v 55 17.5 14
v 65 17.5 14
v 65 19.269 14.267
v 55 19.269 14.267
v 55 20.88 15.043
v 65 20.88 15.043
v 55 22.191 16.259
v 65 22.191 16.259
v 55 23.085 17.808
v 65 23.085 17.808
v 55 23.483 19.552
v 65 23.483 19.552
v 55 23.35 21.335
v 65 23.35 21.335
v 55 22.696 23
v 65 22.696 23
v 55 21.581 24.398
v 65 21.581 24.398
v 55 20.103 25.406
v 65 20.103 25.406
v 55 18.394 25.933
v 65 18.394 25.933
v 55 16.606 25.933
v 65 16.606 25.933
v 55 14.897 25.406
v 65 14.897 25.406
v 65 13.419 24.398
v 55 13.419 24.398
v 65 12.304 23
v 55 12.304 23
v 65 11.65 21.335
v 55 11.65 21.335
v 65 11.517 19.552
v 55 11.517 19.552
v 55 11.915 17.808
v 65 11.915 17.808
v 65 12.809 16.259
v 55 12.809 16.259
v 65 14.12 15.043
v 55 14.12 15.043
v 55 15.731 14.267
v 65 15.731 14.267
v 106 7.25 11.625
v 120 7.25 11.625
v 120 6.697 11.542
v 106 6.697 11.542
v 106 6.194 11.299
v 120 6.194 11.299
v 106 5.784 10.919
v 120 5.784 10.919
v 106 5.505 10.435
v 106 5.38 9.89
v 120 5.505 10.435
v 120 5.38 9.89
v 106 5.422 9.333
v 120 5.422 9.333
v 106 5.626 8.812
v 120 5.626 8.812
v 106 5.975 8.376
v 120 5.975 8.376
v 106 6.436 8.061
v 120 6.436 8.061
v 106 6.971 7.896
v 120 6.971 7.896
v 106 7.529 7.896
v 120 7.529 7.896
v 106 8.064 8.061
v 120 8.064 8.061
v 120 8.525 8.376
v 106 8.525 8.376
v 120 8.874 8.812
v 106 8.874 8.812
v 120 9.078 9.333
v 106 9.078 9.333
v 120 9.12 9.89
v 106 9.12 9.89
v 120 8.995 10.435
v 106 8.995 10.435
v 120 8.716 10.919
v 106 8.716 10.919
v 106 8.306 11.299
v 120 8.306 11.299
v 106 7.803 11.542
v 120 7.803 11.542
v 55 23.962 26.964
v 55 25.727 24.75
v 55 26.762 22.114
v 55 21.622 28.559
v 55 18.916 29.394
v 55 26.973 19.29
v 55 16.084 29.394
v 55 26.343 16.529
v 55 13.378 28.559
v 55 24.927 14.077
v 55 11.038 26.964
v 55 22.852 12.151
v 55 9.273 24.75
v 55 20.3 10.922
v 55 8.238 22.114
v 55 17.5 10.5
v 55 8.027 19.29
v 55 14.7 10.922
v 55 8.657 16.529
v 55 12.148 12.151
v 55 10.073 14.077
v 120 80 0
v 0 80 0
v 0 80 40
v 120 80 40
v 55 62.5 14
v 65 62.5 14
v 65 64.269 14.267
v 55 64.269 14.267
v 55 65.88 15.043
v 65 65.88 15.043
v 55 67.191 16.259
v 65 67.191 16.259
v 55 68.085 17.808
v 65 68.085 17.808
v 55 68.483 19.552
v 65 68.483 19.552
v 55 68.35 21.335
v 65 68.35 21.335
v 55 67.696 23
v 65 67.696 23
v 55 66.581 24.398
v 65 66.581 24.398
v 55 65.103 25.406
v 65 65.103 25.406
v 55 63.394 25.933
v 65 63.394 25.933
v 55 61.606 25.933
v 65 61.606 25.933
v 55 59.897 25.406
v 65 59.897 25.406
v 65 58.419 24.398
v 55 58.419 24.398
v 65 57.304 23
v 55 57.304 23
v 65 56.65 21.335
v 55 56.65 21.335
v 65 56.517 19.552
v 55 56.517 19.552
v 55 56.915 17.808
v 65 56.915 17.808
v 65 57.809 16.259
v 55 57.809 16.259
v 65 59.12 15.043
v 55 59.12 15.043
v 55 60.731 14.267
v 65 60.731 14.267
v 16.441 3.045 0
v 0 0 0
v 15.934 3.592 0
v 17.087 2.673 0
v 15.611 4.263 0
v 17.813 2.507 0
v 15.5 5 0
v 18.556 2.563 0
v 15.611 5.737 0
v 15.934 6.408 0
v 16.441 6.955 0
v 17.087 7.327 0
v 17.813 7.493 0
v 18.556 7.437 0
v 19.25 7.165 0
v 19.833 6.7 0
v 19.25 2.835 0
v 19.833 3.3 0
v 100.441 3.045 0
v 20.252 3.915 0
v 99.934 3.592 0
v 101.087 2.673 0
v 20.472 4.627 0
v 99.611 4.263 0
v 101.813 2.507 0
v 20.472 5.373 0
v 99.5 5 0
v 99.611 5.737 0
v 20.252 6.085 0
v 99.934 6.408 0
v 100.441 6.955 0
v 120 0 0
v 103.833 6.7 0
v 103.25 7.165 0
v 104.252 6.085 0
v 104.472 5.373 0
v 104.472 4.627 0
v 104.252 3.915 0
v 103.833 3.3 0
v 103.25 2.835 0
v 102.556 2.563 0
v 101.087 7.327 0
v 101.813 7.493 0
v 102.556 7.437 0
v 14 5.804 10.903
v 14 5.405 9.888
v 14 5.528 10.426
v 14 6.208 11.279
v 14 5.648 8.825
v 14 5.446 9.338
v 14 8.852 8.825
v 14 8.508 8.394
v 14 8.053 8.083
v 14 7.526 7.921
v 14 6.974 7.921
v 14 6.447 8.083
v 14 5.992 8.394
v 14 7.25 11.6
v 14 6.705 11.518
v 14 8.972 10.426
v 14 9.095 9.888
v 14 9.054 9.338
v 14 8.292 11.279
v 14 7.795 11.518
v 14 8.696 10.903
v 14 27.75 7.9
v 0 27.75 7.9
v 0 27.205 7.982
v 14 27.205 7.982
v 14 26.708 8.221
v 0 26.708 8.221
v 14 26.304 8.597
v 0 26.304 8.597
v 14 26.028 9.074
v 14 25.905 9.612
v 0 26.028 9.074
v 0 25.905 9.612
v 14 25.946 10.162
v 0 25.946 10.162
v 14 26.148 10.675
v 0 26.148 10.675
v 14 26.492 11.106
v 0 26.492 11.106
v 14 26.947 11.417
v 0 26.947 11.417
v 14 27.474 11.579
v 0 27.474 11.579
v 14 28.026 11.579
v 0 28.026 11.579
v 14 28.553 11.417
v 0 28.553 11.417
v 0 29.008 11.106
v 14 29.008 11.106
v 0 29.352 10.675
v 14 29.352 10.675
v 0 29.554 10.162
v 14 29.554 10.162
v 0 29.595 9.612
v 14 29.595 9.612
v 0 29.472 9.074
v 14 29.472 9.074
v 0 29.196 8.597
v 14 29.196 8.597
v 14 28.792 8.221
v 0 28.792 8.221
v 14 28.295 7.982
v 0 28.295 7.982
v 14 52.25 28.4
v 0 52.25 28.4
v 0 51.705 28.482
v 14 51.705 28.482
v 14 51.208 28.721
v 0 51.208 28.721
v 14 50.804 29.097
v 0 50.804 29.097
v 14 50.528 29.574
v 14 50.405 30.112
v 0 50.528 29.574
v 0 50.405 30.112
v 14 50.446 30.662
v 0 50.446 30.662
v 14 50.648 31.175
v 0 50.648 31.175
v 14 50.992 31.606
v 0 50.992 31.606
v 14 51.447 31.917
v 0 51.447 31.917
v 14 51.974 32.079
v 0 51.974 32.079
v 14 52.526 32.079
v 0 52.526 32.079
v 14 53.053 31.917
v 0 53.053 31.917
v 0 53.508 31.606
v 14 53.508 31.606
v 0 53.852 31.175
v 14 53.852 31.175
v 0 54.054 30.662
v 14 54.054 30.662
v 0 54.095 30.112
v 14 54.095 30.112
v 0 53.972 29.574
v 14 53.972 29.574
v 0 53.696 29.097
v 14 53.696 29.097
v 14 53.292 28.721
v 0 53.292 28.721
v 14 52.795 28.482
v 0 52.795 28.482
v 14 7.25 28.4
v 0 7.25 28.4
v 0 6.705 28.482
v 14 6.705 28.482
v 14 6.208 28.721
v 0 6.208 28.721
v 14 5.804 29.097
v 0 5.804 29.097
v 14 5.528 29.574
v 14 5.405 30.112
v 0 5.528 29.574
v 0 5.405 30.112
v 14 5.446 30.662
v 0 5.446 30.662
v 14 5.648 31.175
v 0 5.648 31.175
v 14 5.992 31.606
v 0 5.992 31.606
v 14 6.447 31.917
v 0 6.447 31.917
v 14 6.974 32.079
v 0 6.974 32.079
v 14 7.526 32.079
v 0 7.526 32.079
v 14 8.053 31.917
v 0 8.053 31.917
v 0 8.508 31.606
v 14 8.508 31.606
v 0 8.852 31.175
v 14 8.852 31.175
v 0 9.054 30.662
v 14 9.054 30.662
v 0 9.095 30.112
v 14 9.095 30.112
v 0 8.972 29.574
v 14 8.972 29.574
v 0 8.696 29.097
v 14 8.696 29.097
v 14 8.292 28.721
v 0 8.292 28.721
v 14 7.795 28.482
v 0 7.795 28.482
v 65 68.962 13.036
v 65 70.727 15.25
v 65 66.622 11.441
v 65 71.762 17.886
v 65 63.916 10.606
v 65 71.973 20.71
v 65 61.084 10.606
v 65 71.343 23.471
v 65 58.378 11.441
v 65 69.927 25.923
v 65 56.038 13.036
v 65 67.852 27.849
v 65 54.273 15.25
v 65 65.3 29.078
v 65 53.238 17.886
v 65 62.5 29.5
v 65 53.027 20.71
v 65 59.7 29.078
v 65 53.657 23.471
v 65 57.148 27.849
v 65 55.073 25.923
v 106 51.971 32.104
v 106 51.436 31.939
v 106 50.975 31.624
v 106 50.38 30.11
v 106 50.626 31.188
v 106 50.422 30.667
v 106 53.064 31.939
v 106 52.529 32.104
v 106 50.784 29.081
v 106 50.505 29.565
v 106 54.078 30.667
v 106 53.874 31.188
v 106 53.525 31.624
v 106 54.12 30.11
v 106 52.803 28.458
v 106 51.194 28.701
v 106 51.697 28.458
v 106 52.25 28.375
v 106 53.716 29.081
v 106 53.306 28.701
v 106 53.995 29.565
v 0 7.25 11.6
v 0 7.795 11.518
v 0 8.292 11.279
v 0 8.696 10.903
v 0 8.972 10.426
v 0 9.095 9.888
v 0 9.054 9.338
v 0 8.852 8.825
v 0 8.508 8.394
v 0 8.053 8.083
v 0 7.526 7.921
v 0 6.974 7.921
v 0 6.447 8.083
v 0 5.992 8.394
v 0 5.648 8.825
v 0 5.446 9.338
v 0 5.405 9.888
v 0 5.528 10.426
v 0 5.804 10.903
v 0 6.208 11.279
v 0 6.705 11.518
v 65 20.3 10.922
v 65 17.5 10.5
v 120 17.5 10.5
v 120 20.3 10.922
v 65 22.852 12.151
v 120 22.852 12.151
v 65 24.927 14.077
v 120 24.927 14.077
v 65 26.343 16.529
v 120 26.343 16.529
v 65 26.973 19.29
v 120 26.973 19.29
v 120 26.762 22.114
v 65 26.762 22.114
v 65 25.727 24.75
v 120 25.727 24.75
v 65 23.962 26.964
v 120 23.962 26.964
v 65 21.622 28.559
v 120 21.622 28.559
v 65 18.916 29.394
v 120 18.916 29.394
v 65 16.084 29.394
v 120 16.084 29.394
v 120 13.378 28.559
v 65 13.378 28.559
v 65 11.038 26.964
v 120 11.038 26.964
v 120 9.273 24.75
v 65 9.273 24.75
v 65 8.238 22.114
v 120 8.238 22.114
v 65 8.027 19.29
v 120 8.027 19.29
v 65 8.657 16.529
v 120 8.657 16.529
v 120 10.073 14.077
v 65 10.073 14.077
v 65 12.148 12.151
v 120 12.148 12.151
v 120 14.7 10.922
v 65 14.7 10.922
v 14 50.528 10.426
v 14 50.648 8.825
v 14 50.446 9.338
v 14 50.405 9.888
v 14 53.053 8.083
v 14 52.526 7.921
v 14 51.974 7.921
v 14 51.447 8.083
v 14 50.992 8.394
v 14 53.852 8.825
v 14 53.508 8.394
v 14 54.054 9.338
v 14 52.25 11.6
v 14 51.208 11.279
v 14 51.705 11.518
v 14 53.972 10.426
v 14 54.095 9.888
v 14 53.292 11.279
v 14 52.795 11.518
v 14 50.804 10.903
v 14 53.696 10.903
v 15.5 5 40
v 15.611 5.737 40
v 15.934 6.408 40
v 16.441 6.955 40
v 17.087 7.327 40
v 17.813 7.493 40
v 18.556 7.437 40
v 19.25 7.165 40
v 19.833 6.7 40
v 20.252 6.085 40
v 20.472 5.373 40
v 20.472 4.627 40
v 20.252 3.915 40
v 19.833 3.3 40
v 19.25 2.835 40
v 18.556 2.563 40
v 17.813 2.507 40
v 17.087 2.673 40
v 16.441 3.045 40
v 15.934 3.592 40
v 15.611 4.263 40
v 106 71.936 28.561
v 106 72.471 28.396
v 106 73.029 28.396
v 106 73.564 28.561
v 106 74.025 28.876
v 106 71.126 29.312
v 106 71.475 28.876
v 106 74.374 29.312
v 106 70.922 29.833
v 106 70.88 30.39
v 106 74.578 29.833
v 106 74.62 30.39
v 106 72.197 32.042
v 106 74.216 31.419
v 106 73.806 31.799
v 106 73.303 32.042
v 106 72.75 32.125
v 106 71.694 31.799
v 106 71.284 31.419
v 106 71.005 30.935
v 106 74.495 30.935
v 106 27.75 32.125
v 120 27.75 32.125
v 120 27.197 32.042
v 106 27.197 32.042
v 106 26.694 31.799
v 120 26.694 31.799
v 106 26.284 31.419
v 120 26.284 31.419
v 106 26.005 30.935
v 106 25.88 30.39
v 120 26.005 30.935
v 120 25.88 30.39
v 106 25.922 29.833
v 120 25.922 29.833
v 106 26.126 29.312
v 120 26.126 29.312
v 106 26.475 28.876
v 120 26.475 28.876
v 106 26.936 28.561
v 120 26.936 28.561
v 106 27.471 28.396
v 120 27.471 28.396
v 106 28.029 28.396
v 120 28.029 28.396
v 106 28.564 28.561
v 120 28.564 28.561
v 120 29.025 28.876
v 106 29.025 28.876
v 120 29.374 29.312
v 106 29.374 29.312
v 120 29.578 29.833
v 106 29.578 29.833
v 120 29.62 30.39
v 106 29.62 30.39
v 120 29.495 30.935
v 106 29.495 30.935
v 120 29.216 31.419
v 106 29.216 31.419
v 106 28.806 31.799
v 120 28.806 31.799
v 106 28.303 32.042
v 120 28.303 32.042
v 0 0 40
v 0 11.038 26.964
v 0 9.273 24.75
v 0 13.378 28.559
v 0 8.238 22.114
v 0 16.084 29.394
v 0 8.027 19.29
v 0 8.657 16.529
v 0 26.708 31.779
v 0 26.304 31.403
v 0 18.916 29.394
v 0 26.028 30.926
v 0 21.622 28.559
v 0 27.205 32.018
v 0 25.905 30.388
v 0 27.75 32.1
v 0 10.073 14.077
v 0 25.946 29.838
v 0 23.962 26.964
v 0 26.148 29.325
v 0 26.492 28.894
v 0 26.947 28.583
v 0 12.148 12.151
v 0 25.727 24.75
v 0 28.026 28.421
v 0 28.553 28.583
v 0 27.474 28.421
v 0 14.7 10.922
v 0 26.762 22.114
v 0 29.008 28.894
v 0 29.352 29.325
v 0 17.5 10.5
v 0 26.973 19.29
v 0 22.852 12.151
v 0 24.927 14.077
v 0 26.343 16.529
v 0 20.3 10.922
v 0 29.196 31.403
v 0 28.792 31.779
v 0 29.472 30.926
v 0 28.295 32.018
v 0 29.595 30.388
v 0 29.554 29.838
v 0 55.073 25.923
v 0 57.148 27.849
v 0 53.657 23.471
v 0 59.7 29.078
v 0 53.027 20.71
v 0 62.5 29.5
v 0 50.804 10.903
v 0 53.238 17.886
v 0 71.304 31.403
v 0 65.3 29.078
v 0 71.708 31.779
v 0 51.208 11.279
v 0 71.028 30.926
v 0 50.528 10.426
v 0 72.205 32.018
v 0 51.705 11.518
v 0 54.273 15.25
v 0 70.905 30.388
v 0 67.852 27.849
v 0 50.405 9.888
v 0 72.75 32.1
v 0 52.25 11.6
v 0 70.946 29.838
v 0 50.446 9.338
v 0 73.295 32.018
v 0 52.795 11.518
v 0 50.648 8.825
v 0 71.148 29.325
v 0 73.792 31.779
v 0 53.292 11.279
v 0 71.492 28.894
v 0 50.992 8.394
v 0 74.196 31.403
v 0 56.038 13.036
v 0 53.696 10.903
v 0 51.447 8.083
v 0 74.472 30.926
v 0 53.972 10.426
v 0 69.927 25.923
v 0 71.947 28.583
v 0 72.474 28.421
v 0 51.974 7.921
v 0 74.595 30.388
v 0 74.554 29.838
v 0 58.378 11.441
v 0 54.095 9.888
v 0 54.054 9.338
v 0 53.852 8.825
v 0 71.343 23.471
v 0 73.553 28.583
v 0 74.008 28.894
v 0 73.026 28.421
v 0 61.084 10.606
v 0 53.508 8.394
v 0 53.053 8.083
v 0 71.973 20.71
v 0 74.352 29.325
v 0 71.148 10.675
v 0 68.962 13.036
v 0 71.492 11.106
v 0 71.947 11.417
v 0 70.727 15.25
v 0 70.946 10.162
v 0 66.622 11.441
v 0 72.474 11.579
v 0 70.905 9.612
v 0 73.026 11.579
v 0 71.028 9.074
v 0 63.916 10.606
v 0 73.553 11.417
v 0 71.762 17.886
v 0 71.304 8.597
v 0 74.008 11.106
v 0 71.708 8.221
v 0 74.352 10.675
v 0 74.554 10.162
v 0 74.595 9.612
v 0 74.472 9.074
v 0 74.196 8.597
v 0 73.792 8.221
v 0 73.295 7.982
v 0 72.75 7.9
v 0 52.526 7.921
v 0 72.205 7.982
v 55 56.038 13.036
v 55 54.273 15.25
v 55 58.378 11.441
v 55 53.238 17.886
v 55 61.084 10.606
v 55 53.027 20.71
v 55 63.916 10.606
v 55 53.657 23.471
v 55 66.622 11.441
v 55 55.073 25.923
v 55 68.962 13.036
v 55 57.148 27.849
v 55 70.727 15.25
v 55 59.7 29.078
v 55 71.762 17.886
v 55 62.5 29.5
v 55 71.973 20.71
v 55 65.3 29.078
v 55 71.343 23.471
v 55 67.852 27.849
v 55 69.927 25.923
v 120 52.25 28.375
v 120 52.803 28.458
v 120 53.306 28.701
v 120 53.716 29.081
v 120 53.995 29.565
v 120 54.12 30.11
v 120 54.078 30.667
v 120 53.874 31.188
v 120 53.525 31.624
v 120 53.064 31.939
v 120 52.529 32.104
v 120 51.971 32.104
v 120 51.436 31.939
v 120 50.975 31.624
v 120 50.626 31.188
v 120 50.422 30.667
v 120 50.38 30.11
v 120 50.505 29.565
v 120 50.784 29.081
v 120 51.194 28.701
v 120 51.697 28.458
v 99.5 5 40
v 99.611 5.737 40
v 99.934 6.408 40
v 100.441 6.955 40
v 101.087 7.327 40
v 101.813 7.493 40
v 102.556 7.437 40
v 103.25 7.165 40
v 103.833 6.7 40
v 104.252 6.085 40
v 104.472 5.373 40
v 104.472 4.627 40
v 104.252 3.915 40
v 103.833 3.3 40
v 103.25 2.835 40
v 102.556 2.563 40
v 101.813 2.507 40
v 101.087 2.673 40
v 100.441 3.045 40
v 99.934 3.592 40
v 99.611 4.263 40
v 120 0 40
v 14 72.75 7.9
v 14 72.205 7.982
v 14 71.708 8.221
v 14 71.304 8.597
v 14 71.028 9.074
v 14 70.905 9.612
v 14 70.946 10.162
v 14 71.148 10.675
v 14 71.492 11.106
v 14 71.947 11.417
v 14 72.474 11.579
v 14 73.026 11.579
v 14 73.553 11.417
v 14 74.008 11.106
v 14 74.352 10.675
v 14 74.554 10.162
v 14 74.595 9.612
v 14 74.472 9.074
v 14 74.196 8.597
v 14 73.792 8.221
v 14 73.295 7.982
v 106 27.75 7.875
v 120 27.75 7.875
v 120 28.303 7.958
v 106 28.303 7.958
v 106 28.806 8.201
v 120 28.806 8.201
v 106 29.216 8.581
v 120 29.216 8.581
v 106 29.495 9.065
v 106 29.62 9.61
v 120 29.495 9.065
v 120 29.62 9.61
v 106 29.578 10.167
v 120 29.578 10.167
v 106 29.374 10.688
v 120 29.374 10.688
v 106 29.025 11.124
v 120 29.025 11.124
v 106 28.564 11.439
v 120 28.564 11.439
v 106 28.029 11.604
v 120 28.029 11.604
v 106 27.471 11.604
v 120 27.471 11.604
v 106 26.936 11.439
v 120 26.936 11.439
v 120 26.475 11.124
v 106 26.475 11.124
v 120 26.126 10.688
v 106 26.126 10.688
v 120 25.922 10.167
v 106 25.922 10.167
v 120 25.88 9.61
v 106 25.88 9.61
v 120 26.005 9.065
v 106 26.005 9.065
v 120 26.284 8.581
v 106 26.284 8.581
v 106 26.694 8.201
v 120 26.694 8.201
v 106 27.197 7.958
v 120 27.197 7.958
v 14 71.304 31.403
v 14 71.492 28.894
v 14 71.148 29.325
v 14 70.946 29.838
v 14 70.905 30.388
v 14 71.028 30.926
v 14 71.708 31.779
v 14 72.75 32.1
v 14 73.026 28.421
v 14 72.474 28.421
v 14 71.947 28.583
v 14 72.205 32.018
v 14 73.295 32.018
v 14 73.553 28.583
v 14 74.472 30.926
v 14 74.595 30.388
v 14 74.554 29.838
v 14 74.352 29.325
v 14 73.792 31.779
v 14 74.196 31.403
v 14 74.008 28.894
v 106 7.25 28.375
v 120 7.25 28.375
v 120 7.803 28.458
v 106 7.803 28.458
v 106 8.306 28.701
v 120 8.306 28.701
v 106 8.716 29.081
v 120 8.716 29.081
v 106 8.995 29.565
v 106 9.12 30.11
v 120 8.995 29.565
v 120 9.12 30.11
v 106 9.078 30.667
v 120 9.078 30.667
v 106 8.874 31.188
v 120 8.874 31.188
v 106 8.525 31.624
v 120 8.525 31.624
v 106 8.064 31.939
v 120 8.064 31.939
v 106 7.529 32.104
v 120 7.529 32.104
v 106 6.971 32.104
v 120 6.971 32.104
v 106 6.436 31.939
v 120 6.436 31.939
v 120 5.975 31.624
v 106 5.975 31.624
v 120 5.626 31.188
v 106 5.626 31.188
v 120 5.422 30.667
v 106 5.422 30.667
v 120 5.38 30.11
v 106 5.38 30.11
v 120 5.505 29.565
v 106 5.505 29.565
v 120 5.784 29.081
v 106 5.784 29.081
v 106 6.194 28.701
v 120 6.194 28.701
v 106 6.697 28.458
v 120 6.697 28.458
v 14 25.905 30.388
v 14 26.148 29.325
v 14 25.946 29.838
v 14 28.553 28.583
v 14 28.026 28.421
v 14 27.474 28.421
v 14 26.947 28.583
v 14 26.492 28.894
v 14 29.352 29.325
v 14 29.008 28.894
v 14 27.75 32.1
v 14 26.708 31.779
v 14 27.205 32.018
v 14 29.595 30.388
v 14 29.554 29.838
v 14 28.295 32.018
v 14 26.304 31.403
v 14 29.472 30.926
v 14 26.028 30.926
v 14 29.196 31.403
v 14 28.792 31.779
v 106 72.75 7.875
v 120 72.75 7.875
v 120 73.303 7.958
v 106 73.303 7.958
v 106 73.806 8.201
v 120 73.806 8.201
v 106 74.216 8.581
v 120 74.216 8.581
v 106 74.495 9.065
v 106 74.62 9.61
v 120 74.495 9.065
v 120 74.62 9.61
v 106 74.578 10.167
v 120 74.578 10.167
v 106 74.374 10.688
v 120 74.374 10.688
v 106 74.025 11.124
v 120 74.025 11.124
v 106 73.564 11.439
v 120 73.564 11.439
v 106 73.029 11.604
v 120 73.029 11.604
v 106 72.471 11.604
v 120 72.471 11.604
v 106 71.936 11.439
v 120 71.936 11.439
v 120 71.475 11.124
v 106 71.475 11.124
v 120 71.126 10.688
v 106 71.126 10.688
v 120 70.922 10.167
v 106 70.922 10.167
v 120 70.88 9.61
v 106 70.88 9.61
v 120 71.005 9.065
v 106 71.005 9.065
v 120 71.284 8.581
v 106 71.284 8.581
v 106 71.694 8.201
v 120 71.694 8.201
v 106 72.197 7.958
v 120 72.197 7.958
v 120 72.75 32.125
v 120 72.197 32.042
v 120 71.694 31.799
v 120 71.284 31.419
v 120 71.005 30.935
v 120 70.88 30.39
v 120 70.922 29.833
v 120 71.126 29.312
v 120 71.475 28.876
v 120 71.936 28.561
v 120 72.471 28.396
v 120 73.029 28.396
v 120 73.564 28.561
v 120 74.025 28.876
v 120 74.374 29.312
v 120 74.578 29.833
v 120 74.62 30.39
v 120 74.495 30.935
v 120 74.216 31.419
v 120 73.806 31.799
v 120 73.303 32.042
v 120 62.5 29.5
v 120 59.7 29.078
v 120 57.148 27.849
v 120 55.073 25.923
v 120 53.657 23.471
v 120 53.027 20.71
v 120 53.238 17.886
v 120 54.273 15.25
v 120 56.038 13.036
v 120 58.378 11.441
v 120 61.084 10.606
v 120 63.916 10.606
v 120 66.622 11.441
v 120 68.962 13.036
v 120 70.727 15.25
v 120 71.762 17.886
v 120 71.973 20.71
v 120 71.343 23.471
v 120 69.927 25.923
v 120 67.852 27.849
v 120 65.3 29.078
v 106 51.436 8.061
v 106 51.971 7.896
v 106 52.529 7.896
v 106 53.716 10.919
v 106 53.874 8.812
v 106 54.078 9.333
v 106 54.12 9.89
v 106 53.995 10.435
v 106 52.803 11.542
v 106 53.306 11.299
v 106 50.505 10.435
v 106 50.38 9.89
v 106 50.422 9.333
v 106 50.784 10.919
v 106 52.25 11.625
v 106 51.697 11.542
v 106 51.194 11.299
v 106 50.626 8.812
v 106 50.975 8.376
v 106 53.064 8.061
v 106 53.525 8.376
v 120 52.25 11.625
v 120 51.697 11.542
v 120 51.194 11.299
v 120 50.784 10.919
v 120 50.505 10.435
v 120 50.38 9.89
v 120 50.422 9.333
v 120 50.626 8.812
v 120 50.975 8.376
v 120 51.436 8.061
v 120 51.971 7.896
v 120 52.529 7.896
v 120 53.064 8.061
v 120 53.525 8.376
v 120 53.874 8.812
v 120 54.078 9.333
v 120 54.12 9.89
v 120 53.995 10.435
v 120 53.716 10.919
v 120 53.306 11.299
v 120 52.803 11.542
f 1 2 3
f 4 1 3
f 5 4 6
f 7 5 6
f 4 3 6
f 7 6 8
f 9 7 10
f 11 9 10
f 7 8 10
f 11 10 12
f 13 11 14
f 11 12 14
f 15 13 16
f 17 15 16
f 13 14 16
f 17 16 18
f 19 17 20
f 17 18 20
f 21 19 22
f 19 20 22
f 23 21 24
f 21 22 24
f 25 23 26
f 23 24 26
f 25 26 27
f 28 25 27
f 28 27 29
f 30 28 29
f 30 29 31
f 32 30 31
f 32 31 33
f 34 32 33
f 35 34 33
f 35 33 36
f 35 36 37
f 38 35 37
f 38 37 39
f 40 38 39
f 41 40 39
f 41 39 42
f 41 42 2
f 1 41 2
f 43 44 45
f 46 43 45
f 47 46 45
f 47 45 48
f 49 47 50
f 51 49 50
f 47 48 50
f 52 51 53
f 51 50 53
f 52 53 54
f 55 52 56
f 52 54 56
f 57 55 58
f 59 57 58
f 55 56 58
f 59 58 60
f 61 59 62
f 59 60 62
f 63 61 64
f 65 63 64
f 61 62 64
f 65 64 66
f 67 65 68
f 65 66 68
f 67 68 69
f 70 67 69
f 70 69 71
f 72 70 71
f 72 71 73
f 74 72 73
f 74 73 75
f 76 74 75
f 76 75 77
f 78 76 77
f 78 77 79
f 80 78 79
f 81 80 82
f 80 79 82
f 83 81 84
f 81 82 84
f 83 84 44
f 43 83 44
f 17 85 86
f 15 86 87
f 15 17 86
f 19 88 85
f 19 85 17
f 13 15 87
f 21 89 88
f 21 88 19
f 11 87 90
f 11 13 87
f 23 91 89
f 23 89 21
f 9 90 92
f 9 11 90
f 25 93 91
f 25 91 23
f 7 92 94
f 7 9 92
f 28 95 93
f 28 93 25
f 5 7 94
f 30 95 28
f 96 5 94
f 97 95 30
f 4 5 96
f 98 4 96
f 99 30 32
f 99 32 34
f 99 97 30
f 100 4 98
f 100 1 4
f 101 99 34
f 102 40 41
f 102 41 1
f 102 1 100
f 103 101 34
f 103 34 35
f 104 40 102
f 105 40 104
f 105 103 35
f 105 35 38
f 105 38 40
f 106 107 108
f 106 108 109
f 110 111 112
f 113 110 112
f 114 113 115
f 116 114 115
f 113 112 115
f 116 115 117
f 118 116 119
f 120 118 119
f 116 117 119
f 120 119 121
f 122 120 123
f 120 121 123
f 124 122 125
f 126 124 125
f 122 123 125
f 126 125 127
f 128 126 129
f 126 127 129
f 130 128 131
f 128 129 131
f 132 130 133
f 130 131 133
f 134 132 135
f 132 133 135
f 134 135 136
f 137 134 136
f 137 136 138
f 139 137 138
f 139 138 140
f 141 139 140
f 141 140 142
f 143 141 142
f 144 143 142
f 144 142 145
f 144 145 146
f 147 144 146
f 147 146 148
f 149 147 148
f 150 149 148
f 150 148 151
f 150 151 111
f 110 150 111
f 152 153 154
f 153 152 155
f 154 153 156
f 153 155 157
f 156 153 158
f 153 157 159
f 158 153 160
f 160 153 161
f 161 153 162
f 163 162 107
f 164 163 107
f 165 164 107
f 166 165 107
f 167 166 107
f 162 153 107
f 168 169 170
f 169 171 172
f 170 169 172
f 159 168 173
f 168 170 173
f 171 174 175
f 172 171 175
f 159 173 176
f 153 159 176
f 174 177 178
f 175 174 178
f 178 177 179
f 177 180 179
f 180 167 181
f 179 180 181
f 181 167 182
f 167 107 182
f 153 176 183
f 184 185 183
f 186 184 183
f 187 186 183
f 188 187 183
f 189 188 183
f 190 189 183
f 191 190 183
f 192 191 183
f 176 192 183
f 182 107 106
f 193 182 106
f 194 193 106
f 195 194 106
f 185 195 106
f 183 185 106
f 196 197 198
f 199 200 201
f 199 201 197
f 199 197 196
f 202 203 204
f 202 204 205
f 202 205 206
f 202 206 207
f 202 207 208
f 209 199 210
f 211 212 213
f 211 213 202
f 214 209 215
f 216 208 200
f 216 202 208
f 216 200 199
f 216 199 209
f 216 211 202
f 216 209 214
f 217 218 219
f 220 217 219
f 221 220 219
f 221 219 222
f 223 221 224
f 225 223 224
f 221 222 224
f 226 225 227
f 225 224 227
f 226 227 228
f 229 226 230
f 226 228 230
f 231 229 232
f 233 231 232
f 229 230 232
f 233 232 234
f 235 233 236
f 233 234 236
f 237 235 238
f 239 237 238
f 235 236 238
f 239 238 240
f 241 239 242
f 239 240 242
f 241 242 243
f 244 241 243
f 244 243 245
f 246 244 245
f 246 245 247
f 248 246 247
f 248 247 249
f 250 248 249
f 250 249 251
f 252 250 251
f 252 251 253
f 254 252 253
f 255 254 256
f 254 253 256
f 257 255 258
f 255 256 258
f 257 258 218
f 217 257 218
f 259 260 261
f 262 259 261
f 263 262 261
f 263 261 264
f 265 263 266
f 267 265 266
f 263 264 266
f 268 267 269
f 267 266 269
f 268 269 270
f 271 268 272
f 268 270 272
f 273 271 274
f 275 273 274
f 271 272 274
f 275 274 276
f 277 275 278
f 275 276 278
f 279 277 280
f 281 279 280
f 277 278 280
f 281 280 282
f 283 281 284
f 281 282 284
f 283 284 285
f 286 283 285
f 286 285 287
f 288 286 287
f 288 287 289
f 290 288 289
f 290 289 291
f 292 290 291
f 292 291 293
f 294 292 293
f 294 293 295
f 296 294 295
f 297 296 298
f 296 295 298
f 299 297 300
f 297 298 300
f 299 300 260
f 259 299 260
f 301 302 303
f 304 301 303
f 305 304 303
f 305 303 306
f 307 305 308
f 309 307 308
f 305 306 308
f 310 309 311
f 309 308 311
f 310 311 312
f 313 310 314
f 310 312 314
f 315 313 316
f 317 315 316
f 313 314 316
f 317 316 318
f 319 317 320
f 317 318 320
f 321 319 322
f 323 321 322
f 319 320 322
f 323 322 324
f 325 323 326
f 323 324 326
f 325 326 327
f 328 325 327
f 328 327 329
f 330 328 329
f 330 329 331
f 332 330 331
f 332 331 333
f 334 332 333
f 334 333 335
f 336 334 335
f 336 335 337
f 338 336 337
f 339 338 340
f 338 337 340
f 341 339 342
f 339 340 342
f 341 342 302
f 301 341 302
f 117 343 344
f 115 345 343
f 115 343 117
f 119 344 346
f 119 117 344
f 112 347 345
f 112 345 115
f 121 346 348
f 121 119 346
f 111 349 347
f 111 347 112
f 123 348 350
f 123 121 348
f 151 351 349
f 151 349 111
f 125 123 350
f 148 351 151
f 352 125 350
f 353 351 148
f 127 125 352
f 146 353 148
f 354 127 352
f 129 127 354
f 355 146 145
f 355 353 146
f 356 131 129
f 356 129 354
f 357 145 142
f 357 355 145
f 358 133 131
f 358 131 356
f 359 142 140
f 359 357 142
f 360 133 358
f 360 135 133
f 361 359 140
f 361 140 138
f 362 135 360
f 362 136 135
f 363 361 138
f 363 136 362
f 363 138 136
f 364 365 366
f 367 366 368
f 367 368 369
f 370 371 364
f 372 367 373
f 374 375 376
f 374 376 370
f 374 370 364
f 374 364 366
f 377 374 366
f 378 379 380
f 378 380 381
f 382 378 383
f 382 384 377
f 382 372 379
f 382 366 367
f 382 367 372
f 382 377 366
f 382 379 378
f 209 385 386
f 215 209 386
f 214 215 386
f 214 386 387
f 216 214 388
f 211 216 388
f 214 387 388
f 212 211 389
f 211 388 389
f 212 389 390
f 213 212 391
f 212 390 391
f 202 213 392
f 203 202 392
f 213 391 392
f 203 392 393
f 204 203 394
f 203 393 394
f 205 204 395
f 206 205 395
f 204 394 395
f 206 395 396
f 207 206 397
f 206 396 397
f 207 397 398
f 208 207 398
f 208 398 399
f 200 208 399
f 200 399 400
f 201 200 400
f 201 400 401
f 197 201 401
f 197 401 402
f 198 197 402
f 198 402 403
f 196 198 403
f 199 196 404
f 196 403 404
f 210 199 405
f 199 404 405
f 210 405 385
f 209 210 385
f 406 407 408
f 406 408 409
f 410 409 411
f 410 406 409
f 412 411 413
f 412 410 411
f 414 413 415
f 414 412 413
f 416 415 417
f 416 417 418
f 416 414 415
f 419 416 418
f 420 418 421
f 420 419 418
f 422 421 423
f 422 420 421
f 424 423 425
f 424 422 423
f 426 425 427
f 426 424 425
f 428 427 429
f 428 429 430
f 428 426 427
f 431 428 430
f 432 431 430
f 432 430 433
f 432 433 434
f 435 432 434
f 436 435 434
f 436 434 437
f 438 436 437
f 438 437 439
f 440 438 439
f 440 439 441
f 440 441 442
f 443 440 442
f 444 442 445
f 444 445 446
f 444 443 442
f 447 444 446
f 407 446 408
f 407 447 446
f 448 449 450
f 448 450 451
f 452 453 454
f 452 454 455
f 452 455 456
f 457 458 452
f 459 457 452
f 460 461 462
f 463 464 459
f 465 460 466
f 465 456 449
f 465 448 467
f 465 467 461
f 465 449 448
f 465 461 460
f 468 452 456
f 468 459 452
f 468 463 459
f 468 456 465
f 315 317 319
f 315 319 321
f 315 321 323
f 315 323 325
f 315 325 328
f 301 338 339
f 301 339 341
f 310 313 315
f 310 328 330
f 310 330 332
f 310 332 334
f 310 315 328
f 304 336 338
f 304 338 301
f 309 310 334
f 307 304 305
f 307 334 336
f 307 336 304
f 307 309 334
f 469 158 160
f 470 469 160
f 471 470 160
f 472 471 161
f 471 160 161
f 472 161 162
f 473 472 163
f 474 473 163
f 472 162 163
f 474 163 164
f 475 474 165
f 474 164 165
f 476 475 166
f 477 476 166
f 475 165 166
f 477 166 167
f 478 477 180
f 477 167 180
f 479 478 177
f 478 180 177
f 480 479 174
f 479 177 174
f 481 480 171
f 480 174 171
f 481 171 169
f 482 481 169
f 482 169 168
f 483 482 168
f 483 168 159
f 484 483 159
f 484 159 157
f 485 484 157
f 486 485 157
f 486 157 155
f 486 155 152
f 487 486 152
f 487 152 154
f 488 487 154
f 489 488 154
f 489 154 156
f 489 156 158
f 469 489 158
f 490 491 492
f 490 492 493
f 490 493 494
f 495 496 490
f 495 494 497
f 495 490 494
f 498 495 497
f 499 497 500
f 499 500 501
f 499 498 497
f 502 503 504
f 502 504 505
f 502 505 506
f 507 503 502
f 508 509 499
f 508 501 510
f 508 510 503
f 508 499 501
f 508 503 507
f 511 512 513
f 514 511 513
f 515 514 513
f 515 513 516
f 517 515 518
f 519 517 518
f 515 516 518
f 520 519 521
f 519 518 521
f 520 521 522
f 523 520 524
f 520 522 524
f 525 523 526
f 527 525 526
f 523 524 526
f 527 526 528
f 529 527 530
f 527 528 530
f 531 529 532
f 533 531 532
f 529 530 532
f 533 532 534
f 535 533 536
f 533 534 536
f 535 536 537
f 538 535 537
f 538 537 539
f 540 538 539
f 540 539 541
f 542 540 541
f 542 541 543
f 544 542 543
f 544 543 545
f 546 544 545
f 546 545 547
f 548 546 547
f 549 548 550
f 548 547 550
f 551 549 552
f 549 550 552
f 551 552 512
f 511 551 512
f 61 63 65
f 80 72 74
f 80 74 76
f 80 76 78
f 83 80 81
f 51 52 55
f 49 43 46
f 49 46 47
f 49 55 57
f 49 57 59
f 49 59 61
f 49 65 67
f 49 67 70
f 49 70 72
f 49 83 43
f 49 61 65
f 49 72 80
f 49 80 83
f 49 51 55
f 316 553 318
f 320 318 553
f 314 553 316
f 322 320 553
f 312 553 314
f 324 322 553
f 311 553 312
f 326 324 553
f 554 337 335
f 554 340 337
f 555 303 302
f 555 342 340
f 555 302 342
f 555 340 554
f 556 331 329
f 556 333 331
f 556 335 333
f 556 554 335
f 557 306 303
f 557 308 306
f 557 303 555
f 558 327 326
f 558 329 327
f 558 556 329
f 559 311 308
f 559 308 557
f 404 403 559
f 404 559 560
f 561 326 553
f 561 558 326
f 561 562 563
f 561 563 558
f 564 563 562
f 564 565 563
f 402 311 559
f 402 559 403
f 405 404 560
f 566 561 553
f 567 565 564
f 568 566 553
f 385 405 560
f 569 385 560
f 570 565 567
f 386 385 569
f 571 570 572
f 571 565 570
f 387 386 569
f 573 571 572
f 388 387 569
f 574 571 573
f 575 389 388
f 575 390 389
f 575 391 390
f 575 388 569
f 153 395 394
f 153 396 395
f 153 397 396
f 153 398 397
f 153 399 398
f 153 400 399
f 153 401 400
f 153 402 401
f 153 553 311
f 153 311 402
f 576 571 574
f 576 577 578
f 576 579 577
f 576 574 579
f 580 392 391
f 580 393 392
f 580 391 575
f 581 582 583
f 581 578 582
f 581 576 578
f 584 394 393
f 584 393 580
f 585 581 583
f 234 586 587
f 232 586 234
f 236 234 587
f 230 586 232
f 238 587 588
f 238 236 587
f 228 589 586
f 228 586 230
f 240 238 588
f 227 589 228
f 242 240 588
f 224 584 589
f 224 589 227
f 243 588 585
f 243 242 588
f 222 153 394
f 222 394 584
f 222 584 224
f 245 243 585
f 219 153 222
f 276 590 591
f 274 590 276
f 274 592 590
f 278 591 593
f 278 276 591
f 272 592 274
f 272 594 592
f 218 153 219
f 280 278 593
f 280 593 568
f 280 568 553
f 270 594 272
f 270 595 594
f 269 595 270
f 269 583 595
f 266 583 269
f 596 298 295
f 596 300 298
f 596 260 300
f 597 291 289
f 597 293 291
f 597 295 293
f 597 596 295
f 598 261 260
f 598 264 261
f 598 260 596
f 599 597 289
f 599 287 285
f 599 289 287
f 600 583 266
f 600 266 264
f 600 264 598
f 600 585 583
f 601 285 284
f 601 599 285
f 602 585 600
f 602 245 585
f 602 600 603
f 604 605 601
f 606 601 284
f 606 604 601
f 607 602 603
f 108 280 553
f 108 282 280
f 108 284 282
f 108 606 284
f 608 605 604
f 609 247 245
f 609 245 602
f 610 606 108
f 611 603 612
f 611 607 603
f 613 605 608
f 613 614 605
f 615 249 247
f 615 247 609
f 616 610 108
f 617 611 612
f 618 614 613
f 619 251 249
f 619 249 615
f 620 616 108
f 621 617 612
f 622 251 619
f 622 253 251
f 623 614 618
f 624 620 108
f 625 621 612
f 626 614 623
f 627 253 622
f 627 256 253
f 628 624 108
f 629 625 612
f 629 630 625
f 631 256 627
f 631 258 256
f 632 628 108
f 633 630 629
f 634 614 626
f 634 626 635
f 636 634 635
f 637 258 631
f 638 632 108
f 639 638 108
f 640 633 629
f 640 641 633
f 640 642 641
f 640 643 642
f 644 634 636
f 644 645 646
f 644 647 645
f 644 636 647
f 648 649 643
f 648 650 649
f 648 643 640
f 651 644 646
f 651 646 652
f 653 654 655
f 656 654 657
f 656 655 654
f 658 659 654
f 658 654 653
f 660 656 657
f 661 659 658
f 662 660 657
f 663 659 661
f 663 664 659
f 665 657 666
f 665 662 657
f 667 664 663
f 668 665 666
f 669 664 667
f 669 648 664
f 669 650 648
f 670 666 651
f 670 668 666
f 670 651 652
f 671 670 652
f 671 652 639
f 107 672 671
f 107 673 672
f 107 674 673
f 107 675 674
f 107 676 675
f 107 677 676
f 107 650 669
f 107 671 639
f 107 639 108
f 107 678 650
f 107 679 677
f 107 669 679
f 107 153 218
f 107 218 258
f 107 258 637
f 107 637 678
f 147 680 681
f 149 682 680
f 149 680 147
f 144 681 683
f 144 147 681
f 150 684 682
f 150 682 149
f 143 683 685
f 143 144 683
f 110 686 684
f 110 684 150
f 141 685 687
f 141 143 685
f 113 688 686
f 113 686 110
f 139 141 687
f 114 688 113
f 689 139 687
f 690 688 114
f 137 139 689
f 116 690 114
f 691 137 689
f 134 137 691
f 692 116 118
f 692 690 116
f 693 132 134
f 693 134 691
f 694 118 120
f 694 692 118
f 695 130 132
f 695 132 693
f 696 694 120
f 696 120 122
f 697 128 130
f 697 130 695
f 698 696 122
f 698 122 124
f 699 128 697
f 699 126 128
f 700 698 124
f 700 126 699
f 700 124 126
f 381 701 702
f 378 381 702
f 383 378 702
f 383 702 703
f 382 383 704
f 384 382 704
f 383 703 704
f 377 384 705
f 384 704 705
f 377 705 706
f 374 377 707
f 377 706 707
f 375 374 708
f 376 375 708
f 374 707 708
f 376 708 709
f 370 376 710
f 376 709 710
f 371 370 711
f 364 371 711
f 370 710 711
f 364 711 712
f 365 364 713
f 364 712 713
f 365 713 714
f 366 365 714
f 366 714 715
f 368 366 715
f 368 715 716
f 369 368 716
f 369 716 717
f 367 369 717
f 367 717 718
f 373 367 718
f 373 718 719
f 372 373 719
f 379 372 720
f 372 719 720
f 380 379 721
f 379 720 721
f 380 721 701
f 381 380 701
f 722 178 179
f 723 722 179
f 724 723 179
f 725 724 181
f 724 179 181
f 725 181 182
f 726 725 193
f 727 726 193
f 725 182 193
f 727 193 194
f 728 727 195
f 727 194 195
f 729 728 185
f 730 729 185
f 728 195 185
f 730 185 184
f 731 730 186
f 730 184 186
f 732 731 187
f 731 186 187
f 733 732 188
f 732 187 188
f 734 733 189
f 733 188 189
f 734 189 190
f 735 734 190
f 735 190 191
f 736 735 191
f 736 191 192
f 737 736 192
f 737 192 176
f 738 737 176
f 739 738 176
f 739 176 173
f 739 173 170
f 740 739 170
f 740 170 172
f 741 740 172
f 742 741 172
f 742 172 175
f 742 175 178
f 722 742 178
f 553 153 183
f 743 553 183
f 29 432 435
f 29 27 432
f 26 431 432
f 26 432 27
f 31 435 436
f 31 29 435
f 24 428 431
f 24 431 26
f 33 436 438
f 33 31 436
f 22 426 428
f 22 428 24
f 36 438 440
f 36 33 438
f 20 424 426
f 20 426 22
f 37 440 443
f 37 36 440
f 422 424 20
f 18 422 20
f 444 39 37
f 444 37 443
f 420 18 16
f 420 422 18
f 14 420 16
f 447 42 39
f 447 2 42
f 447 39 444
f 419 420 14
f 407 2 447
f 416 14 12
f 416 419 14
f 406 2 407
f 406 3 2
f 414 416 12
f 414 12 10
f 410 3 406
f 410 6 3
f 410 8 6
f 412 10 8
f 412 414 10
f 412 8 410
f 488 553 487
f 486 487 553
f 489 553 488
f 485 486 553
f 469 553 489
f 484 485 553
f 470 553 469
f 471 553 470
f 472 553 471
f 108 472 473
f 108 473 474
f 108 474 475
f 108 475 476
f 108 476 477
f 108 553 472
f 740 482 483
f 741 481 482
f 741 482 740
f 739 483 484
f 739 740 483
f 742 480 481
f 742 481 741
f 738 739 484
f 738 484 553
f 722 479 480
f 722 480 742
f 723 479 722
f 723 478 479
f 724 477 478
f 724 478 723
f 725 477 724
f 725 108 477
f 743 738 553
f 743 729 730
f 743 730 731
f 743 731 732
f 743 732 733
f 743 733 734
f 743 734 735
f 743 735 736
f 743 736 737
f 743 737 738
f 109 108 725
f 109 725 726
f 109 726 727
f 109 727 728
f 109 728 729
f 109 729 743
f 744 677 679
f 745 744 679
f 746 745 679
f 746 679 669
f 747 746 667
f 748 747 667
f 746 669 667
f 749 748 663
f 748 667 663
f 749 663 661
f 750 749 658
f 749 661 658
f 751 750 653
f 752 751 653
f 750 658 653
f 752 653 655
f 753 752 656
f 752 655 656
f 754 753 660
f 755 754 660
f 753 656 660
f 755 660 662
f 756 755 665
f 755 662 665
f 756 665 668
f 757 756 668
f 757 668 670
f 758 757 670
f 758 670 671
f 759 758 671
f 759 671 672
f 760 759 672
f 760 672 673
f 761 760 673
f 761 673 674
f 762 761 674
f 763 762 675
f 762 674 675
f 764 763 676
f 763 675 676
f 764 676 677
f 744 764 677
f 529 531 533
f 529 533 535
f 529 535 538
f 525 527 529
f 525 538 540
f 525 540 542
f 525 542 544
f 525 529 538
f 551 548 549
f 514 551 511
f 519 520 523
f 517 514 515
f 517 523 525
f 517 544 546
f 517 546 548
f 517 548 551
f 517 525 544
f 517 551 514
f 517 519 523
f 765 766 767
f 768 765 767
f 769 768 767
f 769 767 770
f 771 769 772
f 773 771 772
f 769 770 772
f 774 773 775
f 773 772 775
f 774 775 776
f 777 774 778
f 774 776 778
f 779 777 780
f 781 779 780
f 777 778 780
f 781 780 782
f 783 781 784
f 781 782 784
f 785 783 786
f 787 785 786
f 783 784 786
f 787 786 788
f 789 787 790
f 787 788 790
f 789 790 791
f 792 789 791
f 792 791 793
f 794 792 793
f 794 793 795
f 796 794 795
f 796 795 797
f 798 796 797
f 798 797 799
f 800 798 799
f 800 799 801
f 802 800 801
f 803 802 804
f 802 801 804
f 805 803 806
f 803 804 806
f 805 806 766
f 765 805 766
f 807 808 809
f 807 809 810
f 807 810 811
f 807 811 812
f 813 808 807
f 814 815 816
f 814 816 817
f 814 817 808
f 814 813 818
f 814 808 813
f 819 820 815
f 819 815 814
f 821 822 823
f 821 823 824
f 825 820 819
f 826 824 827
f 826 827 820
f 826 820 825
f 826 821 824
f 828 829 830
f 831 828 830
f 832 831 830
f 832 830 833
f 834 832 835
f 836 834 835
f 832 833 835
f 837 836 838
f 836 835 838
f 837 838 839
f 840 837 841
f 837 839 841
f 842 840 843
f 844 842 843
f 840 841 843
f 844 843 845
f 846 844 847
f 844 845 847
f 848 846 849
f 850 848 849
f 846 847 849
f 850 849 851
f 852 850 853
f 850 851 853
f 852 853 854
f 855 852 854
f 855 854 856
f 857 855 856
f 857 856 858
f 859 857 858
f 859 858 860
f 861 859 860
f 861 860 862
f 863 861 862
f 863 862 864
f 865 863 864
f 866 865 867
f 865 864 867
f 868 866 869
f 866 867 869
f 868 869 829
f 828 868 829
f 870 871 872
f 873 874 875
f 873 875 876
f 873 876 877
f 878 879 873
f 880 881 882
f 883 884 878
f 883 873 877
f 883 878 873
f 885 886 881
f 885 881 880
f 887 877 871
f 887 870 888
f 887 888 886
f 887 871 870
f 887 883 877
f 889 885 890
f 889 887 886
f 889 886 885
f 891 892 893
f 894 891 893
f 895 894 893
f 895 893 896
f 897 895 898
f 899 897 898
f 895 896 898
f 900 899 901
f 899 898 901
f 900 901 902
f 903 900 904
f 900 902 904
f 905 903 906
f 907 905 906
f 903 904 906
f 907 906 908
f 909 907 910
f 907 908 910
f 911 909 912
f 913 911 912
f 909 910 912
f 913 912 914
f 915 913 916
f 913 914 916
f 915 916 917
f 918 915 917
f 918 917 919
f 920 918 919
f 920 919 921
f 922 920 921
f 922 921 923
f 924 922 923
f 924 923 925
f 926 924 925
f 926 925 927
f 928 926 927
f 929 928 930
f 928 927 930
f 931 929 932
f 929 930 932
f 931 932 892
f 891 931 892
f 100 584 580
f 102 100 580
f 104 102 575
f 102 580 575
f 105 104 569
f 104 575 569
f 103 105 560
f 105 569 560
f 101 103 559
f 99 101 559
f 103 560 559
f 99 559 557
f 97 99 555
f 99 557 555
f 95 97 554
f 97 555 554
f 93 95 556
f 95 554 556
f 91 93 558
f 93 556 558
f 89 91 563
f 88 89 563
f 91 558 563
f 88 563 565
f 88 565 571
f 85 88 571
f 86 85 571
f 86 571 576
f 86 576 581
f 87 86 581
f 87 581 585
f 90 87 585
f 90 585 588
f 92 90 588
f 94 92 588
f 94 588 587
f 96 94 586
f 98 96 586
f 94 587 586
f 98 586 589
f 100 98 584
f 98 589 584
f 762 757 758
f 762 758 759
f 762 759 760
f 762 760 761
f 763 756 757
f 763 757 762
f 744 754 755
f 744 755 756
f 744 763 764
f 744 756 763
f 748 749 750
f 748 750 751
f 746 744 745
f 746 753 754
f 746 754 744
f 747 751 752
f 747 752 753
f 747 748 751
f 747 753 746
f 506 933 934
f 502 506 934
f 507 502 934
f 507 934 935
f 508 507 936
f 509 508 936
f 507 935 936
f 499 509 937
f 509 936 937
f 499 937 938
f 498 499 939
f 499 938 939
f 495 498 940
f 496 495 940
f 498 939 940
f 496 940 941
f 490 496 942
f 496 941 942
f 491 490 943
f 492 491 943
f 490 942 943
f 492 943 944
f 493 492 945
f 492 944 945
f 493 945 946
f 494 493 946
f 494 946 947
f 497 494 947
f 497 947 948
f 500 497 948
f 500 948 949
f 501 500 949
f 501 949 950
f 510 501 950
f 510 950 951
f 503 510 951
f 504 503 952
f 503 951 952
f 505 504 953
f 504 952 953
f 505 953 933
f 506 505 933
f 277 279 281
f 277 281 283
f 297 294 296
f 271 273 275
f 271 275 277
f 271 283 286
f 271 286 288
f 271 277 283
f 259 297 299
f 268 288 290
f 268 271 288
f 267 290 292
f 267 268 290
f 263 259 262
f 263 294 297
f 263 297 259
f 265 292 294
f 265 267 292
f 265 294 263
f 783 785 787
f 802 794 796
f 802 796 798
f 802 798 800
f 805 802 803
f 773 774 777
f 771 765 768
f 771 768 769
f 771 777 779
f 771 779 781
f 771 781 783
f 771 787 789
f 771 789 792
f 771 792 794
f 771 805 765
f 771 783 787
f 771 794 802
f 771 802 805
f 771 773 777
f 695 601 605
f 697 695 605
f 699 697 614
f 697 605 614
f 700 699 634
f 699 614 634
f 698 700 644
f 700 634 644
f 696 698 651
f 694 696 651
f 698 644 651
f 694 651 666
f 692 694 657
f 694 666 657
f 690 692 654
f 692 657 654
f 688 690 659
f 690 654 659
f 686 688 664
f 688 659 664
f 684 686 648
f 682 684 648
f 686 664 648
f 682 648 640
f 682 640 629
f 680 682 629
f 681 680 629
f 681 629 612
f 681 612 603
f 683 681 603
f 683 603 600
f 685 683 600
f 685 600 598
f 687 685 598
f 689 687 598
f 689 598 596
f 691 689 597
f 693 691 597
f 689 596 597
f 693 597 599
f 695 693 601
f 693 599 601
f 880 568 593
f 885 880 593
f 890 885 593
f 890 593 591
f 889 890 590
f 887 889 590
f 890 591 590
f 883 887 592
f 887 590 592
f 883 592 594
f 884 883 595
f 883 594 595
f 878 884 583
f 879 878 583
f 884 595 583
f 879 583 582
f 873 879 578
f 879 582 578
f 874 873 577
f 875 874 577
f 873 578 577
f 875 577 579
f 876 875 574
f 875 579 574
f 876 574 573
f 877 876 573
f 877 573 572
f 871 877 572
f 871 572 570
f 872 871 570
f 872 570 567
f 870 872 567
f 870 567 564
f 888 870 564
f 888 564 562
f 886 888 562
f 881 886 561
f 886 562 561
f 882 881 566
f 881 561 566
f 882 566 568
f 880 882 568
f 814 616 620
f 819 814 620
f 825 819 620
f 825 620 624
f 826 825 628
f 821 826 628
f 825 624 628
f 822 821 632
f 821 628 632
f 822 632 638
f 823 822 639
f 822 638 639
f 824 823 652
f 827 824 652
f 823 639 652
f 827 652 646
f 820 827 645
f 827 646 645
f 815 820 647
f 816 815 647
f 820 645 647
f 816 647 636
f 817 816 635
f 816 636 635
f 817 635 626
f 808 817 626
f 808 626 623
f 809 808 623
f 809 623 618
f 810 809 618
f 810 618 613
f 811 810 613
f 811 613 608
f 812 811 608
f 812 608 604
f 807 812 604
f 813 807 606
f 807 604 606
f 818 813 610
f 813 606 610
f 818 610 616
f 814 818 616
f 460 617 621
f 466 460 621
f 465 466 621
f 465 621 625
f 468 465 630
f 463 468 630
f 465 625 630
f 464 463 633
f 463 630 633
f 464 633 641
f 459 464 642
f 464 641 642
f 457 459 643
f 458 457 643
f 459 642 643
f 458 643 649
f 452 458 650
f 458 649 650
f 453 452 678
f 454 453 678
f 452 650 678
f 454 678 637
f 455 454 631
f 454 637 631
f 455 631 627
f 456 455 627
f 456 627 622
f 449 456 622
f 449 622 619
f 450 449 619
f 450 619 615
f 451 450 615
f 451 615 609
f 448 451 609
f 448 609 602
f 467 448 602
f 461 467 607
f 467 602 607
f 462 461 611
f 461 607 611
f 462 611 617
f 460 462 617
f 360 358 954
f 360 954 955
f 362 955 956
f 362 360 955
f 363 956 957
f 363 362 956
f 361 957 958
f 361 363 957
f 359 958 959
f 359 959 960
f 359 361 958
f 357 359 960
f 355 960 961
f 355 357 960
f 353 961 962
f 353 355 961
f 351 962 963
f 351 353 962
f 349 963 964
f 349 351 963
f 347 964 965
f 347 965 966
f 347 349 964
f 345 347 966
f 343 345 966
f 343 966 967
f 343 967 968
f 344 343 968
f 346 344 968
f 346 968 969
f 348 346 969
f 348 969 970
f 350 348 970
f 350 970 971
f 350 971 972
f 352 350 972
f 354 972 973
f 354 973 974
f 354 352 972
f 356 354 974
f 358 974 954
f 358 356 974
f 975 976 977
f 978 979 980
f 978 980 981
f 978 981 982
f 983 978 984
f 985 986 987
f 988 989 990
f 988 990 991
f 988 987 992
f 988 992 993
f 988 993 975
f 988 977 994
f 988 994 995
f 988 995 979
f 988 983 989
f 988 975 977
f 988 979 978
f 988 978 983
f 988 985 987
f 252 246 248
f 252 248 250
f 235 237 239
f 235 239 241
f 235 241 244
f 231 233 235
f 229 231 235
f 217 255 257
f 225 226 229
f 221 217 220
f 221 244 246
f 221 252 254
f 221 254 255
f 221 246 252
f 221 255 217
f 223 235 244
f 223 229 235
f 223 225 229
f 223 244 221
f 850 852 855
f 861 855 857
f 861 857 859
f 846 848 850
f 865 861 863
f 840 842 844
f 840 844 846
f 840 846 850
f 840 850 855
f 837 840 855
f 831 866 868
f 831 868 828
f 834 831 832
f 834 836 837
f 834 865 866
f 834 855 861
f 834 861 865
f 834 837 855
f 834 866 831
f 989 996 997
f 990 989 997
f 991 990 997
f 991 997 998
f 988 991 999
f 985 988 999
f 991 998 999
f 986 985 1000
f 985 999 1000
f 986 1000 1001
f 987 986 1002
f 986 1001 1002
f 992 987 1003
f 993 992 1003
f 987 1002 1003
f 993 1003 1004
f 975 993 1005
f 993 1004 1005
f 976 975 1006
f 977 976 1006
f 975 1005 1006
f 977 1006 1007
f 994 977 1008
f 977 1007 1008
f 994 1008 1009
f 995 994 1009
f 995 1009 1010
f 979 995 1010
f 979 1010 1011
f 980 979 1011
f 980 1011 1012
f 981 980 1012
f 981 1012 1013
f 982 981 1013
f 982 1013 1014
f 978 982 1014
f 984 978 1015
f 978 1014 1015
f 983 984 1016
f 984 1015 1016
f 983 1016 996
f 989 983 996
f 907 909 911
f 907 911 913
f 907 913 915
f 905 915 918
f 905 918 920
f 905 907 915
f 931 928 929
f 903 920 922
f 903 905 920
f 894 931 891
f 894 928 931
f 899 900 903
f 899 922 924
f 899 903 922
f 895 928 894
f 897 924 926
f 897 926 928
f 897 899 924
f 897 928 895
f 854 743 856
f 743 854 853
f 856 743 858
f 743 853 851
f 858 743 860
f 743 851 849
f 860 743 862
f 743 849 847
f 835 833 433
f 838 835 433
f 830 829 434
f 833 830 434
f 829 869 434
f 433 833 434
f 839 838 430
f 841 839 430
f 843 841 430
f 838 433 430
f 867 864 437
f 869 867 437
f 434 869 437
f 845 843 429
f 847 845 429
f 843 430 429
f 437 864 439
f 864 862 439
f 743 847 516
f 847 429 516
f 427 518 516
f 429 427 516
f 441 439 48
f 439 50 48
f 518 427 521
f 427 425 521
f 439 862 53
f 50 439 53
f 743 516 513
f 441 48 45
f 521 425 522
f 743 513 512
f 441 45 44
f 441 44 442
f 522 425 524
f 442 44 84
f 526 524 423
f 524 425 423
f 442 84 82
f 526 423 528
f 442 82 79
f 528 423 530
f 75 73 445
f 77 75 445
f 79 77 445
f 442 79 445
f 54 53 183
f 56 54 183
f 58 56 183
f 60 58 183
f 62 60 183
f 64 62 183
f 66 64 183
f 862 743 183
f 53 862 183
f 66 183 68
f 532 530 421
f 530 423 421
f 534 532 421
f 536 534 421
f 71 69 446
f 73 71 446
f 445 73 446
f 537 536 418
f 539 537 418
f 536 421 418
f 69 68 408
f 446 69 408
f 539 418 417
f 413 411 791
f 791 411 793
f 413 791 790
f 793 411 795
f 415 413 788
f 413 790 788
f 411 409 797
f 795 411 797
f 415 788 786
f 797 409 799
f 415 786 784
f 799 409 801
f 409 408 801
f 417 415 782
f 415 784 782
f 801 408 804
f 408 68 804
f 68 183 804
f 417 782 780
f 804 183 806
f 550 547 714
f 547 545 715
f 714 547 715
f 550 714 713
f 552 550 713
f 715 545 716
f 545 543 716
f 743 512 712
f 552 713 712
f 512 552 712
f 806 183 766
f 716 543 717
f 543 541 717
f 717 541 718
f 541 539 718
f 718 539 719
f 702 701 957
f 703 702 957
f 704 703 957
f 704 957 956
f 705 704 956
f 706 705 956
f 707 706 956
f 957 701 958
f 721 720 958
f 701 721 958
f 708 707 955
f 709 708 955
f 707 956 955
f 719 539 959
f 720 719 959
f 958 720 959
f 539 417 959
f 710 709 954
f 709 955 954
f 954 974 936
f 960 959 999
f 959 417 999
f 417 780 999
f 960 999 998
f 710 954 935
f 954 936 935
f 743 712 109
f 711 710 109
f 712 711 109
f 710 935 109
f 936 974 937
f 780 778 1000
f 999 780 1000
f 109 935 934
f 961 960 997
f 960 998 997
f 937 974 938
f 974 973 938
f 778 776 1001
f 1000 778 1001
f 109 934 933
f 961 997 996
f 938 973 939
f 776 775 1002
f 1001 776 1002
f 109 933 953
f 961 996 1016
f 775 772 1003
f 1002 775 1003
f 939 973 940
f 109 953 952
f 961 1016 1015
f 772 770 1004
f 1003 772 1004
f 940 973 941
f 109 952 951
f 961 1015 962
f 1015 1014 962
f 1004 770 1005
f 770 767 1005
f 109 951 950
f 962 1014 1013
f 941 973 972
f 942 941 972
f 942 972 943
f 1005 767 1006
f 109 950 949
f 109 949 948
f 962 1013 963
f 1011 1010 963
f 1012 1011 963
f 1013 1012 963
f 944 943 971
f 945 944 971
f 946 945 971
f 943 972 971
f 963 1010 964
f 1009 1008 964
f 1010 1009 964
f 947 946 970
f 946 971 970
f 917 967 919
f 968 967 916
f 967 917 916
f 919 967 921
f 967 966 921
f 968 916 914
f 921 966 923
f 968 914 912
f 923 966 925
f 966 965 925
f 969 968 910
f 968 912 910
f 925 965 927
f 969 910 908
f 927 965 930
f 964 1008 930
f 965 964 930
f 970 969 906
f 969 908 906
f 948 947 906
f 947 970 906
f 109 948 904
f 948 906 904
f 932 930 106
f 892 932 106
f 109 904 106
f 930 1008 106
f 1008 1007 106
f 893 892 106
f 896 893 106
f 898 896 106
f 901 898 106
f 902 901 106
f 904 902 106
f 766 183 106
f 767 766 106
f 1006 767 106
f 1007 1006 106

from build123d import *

# Parameters (mm, degrees)
SKETCH1_W                        = 120
SKETCH1_H                        = 80
BOSS_EXTRUDE1_DEPTH              = 40
SKETCH2_R                        = 1.85
LINEAR_BEARING_SCREW_CUTS_DEPTH  = 14
SKETCH3_R                        = 9.5
LINEAR_BEARINGS_HOLE_DEPTH       = 55
SKETCH4_R                        = 1.875
LINEAR_BEARING_SCREW_CUTS2_DEPTH = 14
CUT_EXTRUDE4_START               = -55
SKETCH5_R                        = 9.5
CUT_EXTRUDE4_DEPTH               = 55
SKETCH11_R                       = 6
CUT_EXTRUDE9_DEPTH               = 111.566721937
SKETCH13_R                       = 2.5
CUT_EXTRUDE11_DEPTH              = 150.666295471


with BuildPart() as part:
    # Sketch1 → Boss-Extrude1 (new body)
    with BuildSketch(Plane.XY):
        with Locations((60, 40)):
            Rectangle(SKETCH1_W, SKETCH1_H)
    extrude(amount=BOSS_EXTRUDE1_DEPTH)

    # Sketch2 → linear-bearing-screw-cuts (cut)
    with BuildSketch(Plane.ZY):
        with Locations((30.25, 72.75)):
            Circle(SKETCH2_R)
        with Locations(Location((9.75, 72.75, 0), (0, 0, 180))):
            Circle(SKETCH2_R)
        with Locations(Location((30.25, 52.25, 0), (0, 0, 180))):
            Circle(SKETCH2_R)
        with Locations((9.75, 52.25)):
            Circle(SKETCH2_R)
        with Locations(Location((9.75, 27.75, 0), (0, 0, 180))):
            Circle(SKETCH2_R)
        with Locations((30.25, 27.75)):
            Circle(SKETCH2_R)
        with Locations(Location((30.25, 7.25, 0), (0, 0, 180))):
            Circle(SKETCH2_R)
        with Locations((9.75, 7.25)):
            Circle(SKETCH2_R)
    extrude(amount=-LINEAR_BEARING_SCREW_CUTS_DEPTH, mode=Mode.SUBTRACT)

    # Sketch3 → linear-bearings-hole (cut)
    with BuildSketch(Plane.ZY):
        with Locations((20, 62.5)):
            Circle(SKETCH3_R)
        with Locations(Location((20, 17.5, 0), (0, 0, 180))):
            Circle(SKETCH3_R)
    extrude(amount=-LINEAR_BEARINGS_HOLE_DEPTH, mode=Mode.SUBTRACT)

    # Sketch4 → linear-bearing-screw-cuts2 (cut)
    with BuildSketch(Plane(origin=(120, 0, 0), x_dir=(0, 0, -1), z_dir=(1, 0, 0))):
        with Locations((-9.75, 72.75)):
            Circle(SKETCH4_R)
        with Locations(Location((-30.25, 72.75, 0), (0, 0, 180))):
            Circle(SKETCH4_R)
        with Locations(Location((-9.75, 52.25, 0), (0, 0, 180))):
            Circle(SKETCH4_R)
        with Locations((-30.25, 52.25)):
            Circle(SKETCH4_R)
        with Locations(Location((-30.25, 27.75, 0), (0, 0, 180))):
            Circle(SKETCH4_R)
        with Locations((-9.75, 27.75)):
            Circle(SKETCH4_R)
        with Locations(Location((-9.75, 7.25, 0), (0, 0, 180))):
            Circle(SKETCH4_R)
        with Locations((-30.25, 7.25)):
            Circle(SKETCH4_R)
    extrude(amount=-LINEAR_BEARING_SCREW_CUTS2_DEPTH, mode=Mode.SUBTRACT)

    # Sketch5 → Cut-Extrude4 (cut)
    with BuildSketch(Plane(origin=(120, 0, 0), x_dir=(0, 0, -1), z_dir=(1, 0, 0)).offset(CUT_EXTRUDE4_START)):
        with Locations(Location((-20, 62.5, 0), (0, 0, 180))):
            Circle(SKETCH5_R)
        with Locations((-20, 17.5)):
            Circle(SKETCH5_R)
    extrude(amount=CUT_EXTRUDE4_DEPTH, mode=Mode.SUBTRACT)

    # Sketch11 → Cut-Extrude9 (cut, through all)
    with BuildSketch(Plane(origin=(65, 0, 0), x_dir=(0, 0, -1), z_dir=(1, 0, 0))):
        with Locations((-20, 62.5)):
            Circle(SKETCH11_R)
        with Locations((-20, 17.5)):
            Circle(SKETCH11_R)
    extrude(amount=-CUT_EXTRUDE9_DEPTH, mode=Mode.SUBTRACT)

    # Sketch13 → Cut-Extrude11 (cut, through all)
    with BuildSketch(Plane(origin=(0, 0, 0), x_dir=(-1, 0, 0), z_dir=(0, 0, -1))):
        with Locations((-102, 5)):
            Circle(SKETCH13_R)
        with Locations((-18, 5)):
            Circle(SKETCH13_R)
    extrude(amount=-CUT_EXTRUDE11_DEPTH, mode=Mode.SUBTRACT)


solid = part.part
